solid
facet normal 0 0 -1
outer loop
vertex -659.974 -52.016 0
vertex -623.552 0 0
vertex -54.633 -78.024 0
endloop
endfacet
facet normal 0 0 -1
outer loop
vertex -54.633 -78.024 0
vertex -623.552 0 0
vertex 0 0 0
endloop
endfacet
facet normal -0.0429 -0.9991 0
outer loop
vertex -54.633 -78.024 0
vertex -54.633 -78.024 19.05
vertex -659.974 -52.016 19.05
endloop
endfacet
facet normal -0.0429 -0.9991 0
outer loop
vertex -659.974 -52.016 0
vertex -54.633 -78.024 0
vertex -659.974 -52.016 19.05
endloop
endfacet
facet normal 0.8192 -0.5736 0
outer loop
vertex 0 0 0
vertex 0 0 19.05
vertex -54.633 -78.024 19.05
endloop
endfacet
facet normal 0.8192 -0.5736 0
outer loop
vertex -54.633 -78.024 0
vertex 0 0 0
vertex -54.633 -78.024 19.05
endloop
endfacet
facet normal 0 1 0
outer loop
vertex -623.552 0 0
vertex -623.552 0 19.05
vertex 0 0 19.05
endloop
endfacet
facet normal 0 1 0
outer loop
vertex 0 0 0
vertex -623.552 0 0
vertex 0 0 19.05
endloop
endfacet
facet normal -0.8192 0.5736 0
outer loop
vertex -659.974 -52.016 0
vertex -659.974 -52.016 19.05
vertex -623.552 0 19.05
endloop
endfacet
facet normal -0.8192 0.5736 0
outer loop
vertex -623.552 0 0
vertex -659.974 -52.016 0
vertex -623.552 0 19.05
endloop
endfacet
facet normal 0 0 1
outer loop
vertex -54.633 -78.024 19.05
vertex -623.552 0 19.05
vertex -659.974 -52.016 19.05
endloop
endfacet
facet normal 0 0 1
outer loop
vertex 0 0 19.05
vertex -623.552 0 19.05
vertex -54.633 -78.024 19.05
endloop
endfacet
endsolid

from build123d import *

# Parameters (mm, degrees)
F0_W     = 685.8
F0_H     = 19.05
F1_DEPTH = 88.9
F3_DEPTH = 127
F5_DEPTH = 127
F7_DEPTH = 25.4


with BuildPart() as f1:
    # F0 (on Front) → F1 (new body)
    with BuildSketch(Plane.XZ):
        with Locations((-342.9, 9.525)):
            Rectangle(F0_W, F0_H)
    extrude(amount=F1_DEPTH)

    # F2 (on face) → F3 (cut)
    with BuildSketch(Plane.XY.offset(19.05)):
        Polygon((0, -88.9), (0, 0), (-62.2484501468, -88.9), align=None)
    extrude(amount=-F3_DEPTH, mode=Mode.SUBTRACT)

    # F4 (on face) → F5 (cut)
    with BuildSketch(Plane.XY.offset(19.05)):
        Polygon((-685.8, 0), (-685.8, -88.9), (-623.5515498532, 0), align=None)
    extrude(amount=-F5_DEPTH, mode=Mode.SUBTRACT)

    # F6 (on face) → F7 (cut)
    with BuildSketch(Plane.XY.offset(19.05)):
        Polygon((-685.8, -88.9), (-62.2484501468, -88.9), (-54.6331555624, -78.0242322185), (-659.9736535614, -52.0161548124), align=None)
    extrude(amount=-F7_DEPTH, mode=Mode.SUBTRACT)


solid = f1.part
